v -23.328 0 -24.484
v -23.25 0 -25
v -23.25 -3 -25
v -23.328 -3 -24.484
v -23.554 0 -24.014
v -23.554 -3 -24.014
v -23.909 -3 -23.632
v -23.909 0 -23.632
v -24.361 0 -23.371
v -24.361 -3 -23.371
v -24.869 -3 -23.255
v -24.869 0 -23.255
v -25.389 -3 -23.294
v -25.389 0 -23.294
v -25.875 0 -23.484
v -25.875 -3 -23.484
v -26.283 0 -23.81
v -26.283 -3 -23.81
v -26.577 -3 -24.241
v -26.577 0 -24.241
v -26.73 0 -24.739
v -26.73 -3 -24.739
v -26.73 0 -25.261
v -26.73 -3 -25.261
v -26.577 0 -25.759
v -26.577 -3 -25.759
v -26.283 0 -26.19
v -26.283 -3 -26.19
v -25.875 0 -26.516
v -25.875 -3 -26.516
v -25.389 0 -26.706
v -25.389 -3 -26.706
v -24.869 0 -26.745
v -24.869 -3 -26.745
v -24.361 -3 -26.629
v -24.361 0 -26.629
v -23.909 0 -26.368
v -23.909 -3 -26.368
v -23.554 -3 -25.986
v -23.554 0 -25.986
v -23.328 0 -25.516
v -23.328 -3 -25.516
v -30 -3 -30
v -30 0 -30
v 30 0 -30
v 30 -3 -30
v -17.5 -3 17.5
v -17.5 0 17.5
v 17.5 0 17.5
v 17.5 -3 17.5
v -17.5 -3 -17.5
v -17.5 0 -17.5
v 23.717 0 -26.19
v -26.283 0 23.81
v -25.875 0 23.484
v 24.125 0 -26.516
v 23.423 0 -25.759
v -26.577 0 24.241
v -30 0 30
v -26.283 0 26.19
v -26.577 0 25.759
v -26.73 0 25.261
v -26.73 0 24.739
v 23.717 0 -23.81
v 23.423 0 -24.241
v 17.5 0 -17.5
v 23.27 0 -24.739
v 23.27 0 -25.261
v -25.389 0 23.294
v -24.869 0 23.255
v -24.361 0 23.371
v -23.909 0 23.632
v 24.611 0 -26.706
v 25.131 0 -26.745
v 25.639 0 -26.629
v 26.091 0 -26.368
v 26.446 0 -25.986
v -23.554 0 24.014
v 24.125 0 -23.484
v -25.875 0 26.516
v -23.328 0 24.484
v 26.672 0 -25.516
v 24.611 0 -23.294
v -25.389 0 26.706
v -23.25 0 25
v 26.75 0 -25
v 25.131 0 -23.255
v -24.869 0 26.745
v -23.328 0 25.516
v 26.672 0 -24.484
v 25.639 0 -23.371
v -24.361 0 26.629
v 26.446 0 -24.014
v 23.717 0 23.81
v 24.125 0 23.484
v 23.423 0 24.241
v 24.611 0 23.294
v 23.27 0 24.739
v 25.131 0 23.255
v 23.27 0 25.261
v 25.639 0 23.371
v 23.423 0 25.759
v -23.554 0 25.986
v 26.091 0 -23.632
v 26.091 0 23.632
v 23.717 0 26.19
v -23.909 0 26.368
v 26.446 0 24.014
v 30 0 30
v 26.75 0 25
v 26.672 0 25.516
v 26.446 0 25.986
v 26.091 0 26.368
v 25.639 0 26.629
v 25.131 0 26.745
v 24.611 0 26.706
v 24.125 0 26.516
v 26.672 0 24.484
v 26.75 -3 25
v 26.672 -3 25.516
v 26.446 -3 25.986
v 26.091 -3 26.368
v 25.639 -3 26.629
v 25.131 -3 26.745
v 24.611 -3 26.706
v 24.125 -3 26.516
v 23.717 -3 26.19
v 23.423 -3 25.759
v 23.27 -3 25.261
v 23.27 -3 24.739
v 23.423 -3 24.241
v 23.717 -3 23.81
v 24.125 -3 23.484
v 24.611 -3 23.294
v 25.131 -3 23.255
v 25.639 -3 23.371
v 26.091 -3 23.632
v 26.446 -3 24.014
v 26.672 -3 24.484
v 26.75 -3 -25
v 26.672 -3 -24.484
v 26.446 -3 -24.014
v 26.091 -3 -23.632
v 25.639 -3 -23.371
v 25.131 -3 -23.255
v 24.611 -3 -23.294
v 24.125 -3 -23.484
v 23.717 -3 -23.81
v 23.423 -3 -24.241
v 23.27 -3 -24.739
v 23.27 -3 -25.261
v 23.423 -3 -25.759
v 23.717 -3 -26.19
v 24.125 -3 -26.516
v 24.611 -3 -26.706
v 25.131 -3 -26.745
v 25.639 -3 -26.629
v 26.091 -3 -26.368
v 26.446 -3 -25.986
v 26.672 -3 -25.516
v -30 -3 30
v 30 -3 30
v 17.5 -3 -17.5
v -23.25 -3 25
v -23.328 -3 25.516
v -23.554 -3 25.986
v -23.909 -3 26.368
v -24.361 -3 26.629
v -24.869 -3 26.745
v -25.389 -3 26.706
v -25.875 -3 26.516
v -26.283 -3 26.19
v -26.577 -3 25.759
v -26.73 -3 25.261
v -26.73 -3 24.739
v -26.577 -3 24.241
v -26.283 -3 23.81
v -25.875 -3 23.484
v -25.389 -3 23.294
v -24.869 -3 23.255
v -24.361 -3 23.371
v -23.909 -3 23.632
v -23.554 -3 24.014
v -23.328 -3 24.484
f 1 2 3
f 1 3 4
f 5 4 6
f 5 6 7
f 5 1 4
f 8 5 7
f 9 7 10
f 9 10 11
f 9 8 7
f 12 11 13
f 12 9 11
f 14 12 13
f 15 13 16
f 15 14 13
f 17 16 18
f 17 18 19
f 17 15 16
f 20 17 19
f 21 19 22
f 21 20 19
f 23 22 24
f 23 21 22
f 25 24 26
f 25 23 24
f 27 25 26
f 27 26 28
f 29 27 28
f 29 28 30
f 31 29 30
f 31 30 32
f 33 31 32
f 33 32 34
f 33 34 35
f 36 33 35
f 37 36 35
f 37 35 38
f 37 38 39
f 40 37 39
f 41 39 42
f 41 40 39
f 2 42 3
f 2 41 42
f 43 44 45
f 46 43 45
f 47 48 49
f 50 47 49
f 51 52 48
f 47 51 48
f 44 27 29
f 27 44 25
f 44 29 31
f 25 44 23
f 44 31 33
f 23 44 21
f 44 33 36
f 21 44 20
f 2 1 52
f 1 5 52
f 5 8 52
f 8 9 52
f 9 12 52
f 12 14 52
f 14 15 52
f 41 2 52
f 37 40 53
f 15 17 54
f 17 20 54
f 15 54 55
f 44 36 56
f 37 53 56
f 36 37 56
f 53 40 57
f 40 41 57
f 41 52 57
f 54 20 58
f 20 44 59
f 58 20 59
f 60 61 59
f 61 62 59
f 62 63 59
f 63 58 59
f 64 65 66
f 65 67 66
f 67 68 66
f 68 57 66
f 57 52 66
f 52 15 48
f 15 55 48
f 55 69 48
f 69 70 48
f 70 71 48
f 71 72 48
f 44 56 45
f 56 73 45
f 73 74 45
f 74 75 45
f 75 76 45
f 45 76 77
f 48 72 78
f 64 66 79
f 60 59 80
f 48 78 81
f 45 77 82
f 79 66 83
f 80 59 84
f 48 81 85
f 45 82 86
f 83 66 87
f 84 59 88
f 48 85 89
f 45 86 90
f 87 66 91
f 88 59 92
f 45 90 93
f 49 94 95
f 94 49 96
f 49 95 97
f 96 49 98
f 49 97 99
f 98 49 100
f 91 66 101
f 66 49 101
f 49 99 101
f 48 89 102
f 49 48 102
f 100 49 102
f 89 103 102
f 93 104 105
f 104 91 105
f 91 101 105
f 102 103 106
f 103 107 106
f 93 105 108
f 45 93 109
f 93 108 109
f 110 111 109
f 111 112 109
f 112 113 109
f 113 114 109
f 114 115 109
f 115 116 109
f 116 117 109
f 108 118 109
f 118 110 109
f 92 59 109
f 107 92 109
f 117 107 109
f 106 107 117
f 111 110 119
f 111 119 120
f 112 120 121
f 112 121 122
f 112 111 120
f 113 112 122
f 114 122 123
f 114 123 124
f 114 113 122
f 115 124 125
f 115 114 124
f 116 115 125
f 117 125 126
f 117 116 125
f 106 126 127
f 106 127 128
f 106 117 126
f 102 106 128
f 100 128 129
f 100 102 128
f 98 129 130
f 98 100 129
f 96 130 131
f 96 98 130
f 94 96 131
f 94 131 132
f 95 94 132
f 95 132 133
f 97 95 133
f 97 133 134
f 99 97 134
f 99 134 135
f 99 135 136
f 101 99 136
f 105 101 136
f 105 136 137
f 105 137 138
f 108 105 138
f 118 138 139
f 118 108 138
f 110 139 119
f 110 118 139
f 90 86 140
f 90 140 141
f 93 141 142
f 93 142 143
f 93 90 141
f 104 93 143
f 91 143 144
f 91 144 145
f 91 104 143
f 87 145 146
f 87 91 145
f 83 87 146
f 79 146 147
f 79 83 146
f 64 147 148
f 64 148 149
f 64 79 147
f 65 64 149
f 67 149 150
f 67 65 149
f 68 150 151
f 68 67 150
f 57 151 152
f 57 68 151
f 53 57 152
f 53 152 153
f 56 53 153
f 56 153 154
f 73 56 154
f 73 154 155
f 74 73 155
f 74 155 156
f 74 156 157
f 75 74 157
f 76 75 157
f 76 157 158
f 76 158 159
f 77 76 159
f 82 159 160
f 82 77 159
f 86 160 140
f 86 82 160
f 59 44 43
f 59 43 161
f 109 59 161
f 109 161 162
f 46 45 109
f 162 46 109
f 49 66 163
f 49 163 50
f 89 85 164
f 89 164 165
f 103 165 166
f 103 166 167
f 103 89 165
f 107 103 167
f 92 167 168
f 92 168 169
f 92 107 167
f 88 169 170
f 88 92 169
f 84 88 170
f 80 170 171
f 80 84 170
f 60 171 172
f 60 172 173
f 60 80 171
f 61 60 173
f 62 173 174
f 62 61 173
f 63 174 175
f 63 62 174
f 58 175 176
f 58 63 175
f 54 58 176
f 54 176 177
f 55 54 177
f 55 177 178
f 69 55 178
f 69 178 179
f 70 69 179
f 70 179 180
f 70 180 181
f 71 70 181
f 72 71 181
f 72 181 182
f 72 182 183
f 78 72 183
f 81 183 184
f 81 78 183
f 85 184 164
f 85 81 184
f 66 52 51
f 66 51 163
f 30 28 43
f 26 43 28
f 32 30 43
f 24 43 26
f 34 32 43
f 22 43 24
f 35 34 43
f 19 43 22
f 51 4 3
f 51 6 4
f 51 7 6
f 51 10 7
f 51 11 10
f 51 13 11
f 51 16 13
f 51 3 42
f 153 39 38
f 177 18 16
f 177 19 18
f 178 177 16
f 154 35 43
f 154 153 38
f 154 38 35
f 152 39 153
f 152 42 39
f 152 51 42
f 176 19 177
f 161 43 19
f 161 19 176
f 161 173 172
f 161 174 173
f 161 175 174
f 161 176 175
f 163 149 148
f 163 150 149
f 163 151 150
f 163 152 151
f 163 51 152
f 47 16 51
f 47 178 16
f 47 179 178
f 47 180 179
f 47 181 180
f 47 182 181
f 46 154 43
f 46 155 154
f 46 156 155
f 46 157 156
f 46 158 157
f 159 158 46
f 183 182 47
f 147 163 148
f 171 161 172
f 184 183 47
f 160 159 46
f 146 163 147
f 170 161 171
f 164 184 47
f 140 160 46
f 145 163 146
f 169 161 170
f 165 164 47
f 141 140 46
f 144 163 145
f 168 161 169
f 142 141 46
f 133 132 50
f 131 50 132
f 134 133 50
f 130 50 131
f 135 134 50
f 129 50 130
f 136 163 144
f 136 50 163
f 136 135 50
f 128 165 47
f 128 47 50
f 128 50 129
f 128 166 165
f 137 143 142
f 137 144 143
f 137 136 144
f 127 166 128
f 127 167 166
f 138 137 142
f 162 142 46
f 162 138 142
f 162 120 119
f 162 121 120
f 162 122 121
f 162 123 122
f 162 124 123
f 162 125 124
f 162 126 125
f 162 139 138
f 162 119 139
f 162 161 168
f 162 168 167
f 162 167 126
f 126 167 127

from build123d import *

# Parameters (mm, degrees)
F0_W     = 60
F0_H     = 60
F0_R     = 1.75
F0_W_2   = 35
F0_H_2   = 35
F1_DEPTH = 3


with BuildPart() as f1:
    # F0 (on Front) → F1 (new body)
    with BuildSketch(Plane.XZ):
        Rectangle(F0_W, F0_H)
        with Locations((-25, -25)):
            Circle(F0_R, mode=Mode.SUBTRACT)
        with Locations((25, -25)):
            Circle(F0_R, mode=Mode.SUBTRACT)
        with Locations((-25, 25)):
            Circle(F0_R, mode=Mode.SUBTRACT)
        Rectangle(F0_W_2, F0_H_2, mode=Mode.SUBTRACT)
        with Locations((25, 25)):
            Circle(F0_R, mode=Mode.SUBTRACT)
    extrude(amount=F1_DEPTH)


solid = f1.part
